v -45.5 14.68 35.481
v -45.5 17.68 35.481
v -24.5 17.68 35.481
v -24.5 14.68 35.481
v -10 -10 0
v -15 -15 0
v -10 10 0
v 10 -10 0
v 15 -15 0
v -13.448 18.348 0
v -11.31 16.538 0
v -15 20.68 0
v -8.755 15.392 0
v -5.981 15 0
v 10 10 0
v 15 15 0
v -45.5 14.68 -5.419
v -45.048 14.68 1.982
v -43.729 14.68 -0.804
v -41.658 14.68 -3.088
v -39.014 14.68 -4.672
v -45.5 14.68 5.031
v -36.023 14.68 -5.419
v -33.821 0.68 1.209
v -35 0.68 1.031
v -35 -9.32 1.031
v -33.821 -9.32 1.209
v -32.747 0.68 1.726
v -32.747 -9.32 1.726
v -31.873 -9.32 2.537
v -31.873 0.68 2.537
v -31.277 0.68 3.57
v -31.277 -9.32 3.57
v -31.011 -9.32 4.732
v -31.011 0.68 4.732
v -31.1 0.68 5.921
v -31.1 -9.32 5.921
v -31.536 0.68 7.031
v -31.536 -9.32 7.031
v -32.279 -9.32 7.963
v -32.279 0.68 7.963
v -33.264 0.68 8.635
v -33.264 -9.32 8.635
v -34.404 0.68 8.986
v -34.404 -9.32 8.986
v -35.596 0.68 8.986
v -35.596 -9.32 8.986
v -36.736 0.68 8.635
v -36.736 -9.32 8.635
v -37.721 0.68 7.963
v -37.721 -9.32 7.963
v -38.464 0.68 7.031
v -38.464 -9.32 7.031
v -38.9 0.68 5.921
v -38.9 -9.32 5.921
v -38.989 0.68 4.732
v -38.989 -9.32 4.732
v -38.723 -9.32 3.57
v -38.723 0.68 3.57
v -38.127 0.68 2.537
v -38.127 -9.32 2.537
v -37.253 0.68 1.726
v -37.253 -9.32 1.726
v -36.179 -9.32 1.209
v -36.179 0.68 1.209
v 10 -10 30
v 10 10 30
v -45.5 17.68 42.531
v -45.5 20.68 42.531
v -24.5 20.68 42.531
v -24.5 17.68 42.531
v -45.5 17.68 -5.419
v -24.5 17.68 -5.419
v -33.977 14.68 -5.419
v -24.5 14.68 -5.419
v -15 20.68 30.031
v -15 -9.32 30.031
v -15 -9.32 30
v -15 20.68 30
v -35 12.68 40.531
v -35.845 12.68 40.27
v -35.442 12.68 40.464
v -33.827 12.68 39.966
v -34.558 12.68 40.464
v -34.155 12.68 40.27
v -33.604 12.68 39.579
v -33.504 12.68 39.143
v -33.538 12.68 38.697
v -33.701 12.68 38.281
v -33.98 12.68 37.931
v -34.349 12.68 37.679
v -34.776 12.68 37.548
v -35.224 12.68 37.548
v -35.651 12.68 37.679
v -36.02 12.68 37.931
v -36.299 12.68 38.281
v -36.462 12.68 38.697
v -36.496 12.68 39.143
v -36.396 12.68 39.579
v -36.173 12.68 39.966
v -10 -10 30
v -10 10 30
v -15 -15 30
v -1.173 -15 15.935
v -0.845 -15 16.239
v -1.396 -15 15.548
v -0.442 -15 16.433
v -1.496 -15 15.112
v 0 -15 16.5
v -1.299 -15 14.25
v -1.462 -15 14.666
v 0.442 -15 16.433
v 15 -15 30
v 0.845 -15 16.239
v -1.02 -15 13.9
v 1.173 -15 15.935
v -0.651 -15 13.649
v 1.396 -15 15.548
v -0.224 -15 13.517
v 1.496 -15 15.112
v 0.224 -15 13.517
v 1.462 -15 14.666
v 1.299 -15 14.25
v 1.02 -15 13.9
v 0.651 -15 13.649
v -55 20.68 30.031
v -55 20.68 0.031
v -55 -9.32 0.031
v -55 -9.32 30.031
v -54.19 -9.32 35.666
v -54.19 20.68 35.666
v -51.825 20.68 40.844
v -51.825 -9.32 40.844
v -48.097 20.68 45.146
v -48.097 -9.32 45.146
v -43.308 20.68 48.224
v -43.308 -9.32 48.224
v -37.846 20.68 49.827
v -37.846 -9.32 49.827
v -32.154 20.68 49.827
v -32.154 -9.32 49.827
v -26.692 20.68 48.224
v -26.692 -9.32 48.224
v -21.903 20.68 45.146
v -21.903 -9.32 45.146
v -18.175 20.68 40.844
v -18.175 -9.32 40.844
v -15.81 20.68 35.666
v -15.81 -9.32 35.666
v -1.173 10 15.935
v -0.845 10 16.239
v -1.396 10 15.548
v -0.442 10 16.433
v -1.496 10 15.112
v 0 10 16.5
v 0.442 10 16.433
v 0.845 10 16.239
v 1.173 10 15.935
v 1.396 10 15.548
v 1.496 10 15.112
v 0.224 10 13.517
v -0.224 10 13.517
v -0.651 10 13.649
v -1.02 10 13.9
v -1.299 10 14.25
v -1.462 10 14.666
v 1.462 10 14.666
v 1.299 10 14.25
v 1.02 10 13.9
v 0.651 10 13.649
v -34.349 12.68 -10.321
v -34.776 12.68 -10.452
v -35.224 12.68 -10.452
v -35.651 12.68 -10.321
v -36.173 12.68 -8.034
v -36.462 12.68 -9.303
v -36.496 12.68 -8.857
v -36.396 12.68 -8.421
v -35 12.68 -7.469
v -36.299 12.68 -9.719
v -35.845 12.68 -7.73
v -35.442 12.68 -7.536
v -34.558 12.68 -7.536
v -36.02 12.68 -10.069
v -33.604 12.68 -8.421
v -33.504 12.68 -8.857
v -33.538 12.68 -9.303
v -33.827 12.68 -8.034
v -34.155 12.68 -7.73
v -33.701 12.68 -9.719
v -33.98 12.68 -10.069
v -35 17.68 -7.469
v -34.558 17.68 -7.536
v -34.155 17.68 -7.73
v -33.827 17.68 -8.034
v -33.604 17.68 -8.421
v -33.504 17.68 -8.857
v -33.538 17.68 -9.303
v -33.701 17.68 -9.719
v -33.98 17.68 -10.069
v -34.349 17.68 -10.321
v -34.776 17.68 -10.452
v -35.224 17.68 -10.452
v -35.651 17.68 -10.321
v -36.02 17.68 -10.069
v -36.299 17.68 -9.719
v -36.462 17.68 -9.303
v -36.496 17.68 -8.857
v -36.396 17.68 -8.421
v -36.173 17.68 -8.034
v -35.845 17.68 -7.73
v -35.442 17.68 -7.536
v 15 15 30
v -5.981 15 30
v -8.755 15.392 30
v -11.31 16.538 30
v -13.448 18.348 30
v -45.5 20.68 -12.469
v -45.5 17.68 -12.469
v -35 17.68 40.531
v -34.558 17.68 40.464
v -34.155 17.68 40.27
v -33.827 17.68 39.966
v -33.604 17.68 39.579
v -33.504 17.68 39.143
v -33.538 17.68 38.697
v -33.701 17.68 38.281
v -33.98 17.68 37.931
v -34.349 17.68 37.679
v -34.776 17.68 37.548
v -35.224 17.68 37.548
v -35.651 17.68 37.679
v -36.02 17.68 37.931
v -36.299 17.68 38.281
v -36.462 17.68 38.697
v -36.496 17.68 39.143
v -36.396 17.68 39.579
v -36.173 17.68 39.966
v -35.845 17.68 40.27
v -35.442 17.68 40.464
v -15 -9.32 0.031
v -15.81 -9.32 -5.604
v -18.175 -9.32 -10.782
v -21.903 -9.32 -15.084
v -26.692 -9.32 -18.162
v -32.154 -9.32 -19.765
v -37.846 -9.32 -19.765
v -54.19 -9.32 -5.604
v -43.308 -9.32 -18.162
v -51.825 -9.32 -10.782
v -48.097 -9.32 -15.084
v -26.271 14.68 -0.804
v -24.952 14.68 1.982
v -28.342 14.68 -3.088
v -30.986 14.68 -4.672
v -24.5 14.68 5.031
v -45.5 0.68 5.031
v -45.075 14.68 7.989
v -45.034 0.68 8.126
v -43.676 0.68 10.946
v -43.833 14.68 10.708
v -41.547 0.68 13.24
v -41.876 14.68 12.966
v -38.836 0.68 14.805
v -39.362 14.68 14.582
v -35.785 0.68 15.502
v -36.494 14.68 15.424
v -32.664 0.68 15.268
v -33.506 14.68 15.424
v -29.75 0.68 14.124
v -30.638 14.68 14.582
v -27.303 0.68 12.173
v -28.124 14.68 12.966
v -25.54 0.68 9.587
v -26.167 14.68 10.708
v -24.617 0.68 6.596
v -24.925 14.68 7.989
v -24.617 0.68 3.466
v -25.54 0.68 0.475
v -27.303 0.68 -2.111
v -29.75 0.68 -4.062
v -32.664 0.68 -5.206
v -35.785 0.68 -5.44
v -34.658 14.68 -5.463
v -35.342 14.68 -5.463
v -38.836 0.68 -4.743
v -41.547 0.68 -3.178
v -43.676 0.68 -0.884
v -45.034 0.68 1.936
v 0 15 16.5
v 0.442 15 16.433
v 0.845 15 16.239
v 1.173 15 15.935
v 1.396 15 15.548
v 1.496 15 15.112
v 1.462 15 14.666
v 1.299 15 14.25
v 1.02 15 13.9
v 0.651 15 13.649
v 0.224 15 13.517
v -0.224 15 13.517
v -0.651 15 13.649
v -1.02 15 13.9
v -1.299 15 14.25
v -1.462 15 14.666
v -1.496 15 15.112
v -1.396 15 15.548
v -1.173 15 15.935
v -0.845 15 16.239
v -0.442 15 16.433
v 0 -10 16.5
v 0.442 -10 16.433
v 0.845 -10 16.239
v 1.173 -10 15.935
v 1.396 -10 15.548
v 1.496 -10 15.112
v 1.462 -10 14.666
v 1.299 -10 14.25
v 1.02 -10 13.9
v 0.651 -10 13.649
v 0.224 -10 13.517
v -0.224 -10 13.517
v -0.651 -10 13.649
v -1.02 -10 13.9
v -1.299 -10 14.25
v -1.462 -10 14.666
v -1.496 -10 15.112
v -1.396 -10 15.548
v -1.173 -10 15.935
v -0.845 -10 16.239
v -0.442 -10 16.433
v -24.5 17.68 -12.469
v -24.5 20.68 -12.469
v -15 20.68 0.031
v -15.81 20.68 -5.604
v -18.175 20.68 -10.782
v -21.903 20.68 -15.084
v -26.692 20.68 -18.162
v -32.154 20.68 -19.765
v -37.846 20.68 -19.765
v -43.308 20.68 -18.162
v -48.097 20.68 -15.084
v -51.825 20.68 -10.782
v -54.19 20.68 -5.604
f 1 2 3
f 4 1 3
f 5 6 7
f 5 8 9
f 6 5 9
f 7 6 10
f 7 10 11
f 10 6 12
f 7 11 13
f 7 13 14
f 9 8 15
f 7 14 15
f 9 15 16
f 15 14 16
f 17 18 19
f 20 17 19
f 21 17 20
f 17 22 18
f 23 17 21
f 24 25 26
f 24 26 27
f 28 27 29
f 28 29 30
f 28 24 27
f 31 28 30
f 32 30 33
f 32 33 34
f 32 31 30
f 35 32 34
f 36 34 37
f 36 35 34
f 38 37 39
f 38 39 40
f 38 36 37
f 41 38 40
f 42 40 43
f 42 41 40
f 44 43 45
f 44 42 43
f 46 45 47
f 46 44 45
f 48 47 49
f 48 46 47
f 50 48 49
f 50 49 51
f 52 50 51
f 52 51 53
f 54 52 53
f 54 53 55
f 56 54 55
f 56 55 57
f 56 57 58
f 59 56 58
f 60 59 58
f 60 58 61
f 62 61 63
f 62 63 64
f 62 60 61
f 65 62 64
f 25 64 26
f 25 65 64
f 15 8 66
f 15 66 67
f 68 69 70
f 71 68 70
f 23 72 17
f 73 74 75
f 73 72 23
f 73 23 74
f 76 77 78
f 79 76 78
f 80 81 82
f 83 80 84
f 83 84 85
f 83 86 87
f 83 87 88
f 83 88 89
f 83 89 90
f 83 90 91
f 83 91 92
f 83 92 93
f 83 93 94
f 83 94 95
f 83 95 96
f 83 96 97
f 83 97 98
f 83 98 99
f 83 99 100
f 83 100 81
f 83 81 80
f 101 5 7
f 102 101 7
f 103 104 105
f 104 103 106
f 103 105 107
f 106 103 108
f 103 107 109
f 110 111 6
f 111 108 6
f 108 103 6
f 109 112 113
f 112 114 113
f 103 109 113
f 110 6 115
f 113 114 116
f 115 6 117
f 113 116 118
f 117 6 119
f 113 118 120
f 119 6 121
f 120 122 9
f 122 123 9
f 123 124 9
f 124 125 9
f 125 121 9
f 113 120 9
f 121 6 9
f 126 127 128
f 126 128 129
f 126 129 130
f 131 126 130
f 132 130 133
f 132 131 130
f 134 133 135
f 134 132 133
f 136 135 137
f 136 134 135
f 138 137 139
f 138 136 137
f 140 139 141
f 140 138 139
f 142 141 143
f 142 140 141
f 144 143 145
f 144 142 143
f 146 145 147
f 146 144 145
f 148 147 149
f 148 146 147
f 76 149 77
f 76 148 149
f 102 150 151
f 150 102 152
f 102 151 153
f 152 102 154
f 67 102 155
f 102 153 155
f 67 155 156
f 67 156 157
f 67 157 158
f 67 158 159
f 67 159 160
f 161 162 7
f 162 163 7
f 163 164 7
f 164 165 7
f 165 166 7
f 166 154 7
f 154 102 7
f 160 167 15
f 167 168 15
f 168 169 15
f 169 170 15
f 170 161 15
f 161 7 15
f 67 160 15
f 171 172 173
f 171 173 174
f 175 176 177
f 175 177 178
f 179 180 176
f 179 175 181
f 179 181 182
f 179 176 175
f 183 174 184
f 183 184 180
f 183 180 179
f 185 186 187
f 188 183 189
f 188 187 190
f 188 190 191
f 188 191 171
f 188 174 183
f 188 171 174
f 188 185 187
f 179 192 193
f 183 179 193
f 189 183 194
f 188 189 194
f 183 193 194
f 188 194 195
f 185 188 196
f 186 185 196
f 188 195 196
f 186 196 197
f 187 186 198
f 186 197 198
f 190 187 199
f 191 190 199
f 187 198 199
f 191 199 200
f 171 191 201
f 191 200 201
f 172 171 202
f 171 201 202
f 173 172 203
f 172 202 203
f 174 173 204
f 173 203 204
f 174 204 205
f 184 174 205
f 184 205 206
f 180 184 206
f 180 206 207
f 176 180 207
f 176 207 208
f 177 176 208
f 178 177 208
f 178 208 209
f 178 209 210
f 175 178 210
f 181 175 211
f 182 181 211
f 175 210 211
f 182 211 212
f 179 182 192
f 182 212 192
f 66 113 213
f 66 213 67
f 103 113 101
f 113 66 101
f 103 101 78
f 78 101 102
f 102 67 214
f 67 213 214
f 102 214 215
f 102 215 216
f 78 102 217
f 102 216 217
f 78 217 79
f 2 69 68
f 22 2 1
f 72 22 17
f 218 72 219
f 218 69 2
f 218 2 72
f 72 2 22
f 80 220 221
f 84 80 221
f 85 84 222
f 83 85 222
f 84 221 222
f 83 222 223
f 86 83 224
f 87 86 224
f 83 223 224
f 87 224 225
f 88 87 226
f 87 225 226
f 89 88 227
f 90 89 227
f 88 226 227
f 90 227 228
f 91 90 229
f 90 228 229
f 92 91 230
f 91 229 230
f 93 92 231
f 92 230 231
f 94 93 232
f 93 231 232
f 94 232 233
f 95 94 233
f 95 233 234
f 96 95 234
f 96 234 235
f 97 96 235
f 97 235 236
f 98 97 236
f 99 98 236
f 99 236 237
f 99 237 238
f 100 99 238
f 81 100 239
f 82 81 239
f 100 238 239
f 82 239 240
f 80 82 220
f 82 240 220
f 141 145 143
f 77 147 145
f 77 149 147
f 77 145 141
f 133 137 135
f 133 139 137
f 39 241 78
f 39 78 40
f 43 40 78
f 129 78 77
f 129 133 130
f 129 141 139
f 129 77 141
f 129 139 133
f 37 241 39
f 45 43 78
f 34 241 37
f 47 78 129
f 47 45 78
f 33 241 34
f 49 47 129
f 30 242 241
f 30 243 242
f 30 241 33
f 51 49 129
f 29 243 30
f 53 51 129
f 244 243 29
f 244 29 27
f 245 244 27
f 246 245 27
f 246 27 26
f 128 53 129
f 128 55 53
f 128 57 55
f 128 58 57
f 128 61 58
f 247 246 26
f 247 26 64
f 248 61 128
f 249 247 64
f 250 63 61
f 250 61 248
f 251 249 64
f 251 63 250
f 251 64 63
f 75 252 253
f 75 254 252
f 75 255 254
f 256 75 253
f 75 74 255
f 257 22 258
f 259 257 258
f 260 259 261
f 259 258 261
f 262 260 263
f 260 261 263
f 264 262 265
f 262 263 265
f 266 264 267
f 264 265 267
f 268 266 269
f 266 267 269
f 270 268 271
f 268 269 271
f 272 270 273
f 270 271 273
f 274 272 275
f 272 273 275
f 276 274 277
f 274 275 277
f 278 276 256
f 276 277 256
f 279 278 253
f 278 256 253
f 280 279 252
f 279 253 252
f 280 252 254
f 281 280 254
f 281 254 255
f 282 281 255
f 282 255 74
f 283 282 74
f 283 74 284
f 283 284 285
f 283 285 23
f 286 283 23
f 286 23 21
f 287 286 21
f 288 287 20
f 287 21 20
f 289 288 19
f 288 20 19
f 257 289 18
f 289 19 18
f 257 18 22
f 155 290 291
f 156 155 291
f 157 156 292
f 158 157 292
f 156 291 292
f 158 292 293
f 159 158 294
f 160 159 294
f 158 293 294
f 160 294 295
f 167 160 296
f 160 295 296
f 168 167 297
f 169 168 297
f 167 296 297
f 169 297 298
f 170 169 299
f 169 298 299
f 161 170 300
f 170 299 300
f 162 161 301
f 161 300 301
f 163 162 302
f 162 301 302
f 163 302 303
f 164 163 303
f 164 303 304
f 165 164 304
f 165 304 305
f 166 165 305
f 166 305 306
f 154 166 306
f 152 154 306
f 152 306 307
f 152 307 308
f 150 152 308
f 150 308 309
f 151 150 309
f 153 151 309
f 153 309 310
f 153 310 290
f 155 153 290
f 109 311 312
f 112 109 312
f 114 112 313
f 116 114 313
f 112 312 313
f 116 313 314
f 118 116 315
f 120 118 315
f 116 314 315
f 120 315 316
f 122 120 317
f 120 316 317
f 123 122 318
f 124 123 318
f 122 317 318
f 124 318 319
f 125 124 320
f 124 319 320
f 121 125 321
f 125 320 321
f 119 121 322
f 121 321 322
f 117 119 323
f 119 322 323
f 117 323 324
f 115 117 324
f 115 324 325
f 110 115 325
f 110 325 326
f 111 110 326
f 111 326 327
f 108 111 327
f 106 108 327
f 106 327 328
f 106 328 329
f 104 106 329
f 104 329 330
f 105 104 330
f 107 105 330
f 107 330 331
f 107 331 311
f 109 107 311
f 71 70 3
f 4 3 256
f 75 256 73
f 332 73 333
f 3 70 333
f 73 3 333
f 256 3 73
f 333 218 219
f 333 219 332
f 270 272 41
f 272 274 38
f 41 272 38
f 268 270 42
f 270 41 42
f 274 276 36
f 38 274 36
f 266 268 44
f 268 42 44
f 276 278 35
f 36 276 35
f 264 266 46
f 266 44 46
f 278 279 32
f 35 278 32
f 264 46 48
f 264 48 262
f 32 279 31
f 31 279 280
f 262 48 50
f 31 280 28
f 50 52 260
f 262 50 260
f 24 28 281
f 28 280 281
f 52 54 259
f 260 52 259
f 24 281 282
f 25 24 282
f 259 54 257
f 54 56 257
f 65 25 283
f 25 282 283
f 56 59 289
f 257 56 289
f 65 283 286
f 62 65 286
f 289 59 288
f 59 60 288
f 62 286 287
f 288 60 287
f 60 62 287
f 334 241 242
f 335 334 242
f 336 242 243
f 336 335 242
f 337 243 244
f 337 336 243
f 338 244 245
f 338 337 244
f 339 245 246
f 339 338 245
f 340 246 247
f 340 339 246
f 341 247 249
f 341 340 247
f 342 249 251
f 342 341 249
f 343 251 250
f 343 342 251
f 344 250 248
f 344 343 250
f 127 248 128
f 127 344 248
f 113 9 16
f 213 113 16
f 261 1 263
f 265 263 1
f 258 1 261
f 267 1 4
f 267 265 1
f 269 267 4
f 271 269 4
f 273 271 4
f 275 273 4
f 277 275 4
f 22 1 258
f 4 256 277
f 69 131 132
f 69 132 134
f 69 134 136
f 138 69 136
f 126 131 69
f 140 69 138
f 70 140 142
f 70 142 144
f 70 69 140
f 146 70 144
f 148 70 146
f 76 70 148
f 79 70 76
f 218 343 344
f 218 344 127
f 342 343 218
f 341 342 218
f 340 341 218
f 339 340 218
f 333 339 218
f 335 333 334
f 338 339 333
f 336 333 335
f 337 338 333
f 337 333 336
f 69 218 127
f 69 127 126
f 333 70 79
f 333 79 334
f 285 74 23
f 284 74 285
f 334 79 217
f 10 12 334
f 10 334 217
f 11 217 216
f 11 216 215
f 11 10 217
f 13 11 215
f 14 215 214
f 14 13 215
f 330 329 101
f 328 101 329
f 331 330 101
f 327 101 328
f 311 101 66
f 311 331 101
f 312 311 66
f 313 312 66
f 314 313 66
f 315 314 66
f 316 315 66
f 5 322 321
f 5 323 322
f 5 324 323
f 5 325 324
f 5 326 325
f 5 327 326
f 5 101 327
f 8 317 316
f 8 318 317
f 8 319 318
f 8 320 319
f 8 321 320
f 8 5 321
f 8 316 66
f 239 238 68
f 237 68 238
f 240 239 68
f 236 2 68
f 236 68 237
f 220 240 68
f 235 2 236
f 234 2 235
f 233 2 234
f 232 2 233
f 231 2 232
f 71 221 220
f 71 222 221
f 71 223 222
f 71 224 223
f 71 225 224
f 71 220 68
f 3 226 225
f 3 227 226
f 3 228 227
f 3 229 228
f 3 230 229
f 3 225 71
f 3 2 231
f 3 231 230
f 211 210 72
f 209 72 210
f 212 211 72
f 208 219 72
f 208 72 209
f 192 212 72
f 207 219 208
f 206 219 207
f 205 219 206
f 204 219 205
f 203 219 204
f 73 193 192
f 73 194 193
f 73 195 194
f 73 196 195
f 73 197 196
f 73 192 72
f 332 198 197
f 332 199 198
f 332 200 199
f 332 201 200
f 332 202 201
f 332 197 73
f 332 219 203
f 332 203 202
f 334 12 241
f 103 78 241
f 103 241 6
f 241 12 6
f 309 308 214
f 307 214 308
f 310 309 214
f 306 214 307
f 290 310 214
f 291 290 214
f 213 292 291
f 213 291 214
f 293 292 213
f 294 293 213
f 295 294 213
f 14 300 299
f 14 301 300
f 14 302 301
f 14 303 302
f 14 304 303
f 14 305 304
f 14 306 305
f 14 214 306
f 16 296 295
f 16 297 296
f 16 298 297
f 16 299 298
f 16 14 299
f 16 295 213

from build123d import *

# Parameters (mm, degrees)
SKETCH1_W           = 30
SKETCH1_H           = 30
SKETCH1_W_2         = 20
SKETCH1_H_2         = 20
BOSS_EXTRUDE2_DEPTH = 30
BOSS_EXTRUDE3_DEPTH = 30
SKETCH6_W           = 21
SKETCH6_H           = 55
CUT_EXTRUDE1_DEPTH  = 3
SKETCH7_R           = 1.5
CUT_EXTRUDE2_DEPTH  = 5
SKETCH8_W           = 21
SKETCH8_H           = 40.9
CUT_EXTRUDE3_DEPTH  = 3
SKETCH9_R           = 10.5
CUT_EXTRUDE4_DEPTH  = 81.056214629
BOSS_EXTRUDE4_START = -10
SKETCH10_R          = 10.5
SKETCH10_R_2        = 4
BOSS_EXTRUDE4_DEPTH = 10
FILLET1_R           = 10
SKETCH11_R          = 1.5
CUT_EXTRUDE5_DEPTH  = 81.175402093


with BuildPart() as part:
    # Sketch1 → Boss-Extrude2 (new body)
    with BuildSketch(Plane.XY):
        Rectangle(SKETCH1_W, SKETCH1_H)
        Rectangle(SKETCH1_W_2, SKETCH1_H_2, mode=Mode.SUBTRACT)
    extrude(amount=BOSS_EXTRUDE2_DEPTH)

    # Sketch5 → Boss-Extrude3 (add)
    with BuildSketch(Plane(origin=(0, 20.68, 0), x_dir=(1, 0, 0), z_dir=(0, 1, 0))):
        with BuildLine():
            Line((-15, -30.030941434), (-15, -0.030941434))
            ThreePointArc((-15, -0.030941434), (-35, 19.969058566), (-55, -0.030941434))
            Line((-55, -0.030941434), (-55, -30.030941434))
            ThreePointArc((-55, -30.030941434), (-35, -50.030941434), (-15, -30.030941434))
        make_face()
    extrude(amount=-BOSS_EXTRUDE3_DEPTH)

    # Sketch6 → Cut-Extrude1 (cut)
    with BuildSketch(Plane(origin=(0, 20.68, 0), x_dir=(1, 0, 0), z_dir=(0, 1, 0))):
        with Locations((-35, -15.030941434)):
            Rectangle(SKETCH6_W, SKETCH6_H)
    extrude(amount=-CUT_EXTRUDE1_DEPTH, mode=Mode.SUBTRACT)

    # Sketch7 → Cut-Extrude2 (cut)
    with BuildSketch(Plane(origin=(0, 17.68, 0), x_dir=(1, 0, 0), z_dir=(0, 1, 0))):
        with Locations(Location((-35, -39.030941434, 0), (0, 0, 270))):
            Circle(SKETCH7_R)
        with Locations(Location((-35, 8.969058566, 0), (0, 0, 270))):
            Circle(SKETCH7_R)
    extrude(amount=-CUT_EXTRUDE2_DEPTH, mode=Mode.SUBTRACT)

    # Sketch8 → Cut-Extrude3 (cut)
    with BuildSketch(Plane(origin=(0, 17.68, 0), x_dir=(1, 0, 0), z_dir=(0, 1, 0))):
        with Locations((-35, -15.030941434)):
            Rectangle(SKETCH8_W, SKETCH8_H)
    extrude(amount=-CUT_EXTRUDE3_DEPTH, mode=Mode.SUBTRACT)

    # Sketch9 → Cut-Extrude4 (cut, through all)
    with BuildSketch(Plane(origin=(0, 14.68, 0), x_dir=(1, 0, 0), z_dir=(0, 1, 0))):
        with Locations(Location((-35, -5.030941434, 0), (0, 0, 180))):
            Circle(SKETCH9_R)
    extrude(amount=-CUT_EXTRUDE4_DEPTH, mode=Mode.SUBTRACT)

    # Sketch10 → Boss-Extrude4 (add)
    with BuildSketch(Plane.XZ.offset(9.32).offset(BOSS_EXTRUDE4_START)):
        with Locations(Location((-35, 5.030941434, 0), (0, 0, 180))):
            Circle(SKETCH10_R)
        with Locations(Location((-35, 5.030941434, 0), (0, 0, 270))):
            Circle(SKETCH10_R_2, mode=Mode.SUBTRACT)
    extrude(amount=BOSS_EXTRUDE4_DEPTH)

    # Fillet1
    # the kernel refuses this fillet: 10 mm, written as the material it adds along each edge
    with BuildSketch(Plane(origin=(-15, 15, -22.515898699), x_dir=(1, 0, 0), z_dir=(0, 0, 1))) as fillet1_piece_1_section:
        with BuildLine():
            CenterArc((9.018736053, 10), FILLET1_R, 205.594552278, 64.405447722)
            Line((0, 5.68), (0, 0))
            Line((0, 0), (9.018736053, 0))
        make_face()
    fillet1_piece_1 = extrude(amount=52.515898699, mode=Mode.PRIVATE)
    fillet1_piece_1 = split(fillet1_piece_1, bisect_by=Plane(origin=(-11.321087315, 16.521398323, 0), z_dir=(0, 0, 1)), keep=Keep.TOP, mode=Mode.PRIVATE)
    add(fillet1_piece_1)

    # Sketch11 → Cut-Extrude5 (cut, through all)
    with BuildSketch(Plane(origin=(0, 15, 0), x_dir=(1, 0, 0), z_dir=(0, 1, 0))):
        with Locations(Location((0, -15, 0), (0, 0, 270))):
            Circle(SKETCH11_R)
    extrude(amount=-CUT_EXTRUDE5_DEPTH, mode=Mode.SUBTRACT)


solid = part.part
